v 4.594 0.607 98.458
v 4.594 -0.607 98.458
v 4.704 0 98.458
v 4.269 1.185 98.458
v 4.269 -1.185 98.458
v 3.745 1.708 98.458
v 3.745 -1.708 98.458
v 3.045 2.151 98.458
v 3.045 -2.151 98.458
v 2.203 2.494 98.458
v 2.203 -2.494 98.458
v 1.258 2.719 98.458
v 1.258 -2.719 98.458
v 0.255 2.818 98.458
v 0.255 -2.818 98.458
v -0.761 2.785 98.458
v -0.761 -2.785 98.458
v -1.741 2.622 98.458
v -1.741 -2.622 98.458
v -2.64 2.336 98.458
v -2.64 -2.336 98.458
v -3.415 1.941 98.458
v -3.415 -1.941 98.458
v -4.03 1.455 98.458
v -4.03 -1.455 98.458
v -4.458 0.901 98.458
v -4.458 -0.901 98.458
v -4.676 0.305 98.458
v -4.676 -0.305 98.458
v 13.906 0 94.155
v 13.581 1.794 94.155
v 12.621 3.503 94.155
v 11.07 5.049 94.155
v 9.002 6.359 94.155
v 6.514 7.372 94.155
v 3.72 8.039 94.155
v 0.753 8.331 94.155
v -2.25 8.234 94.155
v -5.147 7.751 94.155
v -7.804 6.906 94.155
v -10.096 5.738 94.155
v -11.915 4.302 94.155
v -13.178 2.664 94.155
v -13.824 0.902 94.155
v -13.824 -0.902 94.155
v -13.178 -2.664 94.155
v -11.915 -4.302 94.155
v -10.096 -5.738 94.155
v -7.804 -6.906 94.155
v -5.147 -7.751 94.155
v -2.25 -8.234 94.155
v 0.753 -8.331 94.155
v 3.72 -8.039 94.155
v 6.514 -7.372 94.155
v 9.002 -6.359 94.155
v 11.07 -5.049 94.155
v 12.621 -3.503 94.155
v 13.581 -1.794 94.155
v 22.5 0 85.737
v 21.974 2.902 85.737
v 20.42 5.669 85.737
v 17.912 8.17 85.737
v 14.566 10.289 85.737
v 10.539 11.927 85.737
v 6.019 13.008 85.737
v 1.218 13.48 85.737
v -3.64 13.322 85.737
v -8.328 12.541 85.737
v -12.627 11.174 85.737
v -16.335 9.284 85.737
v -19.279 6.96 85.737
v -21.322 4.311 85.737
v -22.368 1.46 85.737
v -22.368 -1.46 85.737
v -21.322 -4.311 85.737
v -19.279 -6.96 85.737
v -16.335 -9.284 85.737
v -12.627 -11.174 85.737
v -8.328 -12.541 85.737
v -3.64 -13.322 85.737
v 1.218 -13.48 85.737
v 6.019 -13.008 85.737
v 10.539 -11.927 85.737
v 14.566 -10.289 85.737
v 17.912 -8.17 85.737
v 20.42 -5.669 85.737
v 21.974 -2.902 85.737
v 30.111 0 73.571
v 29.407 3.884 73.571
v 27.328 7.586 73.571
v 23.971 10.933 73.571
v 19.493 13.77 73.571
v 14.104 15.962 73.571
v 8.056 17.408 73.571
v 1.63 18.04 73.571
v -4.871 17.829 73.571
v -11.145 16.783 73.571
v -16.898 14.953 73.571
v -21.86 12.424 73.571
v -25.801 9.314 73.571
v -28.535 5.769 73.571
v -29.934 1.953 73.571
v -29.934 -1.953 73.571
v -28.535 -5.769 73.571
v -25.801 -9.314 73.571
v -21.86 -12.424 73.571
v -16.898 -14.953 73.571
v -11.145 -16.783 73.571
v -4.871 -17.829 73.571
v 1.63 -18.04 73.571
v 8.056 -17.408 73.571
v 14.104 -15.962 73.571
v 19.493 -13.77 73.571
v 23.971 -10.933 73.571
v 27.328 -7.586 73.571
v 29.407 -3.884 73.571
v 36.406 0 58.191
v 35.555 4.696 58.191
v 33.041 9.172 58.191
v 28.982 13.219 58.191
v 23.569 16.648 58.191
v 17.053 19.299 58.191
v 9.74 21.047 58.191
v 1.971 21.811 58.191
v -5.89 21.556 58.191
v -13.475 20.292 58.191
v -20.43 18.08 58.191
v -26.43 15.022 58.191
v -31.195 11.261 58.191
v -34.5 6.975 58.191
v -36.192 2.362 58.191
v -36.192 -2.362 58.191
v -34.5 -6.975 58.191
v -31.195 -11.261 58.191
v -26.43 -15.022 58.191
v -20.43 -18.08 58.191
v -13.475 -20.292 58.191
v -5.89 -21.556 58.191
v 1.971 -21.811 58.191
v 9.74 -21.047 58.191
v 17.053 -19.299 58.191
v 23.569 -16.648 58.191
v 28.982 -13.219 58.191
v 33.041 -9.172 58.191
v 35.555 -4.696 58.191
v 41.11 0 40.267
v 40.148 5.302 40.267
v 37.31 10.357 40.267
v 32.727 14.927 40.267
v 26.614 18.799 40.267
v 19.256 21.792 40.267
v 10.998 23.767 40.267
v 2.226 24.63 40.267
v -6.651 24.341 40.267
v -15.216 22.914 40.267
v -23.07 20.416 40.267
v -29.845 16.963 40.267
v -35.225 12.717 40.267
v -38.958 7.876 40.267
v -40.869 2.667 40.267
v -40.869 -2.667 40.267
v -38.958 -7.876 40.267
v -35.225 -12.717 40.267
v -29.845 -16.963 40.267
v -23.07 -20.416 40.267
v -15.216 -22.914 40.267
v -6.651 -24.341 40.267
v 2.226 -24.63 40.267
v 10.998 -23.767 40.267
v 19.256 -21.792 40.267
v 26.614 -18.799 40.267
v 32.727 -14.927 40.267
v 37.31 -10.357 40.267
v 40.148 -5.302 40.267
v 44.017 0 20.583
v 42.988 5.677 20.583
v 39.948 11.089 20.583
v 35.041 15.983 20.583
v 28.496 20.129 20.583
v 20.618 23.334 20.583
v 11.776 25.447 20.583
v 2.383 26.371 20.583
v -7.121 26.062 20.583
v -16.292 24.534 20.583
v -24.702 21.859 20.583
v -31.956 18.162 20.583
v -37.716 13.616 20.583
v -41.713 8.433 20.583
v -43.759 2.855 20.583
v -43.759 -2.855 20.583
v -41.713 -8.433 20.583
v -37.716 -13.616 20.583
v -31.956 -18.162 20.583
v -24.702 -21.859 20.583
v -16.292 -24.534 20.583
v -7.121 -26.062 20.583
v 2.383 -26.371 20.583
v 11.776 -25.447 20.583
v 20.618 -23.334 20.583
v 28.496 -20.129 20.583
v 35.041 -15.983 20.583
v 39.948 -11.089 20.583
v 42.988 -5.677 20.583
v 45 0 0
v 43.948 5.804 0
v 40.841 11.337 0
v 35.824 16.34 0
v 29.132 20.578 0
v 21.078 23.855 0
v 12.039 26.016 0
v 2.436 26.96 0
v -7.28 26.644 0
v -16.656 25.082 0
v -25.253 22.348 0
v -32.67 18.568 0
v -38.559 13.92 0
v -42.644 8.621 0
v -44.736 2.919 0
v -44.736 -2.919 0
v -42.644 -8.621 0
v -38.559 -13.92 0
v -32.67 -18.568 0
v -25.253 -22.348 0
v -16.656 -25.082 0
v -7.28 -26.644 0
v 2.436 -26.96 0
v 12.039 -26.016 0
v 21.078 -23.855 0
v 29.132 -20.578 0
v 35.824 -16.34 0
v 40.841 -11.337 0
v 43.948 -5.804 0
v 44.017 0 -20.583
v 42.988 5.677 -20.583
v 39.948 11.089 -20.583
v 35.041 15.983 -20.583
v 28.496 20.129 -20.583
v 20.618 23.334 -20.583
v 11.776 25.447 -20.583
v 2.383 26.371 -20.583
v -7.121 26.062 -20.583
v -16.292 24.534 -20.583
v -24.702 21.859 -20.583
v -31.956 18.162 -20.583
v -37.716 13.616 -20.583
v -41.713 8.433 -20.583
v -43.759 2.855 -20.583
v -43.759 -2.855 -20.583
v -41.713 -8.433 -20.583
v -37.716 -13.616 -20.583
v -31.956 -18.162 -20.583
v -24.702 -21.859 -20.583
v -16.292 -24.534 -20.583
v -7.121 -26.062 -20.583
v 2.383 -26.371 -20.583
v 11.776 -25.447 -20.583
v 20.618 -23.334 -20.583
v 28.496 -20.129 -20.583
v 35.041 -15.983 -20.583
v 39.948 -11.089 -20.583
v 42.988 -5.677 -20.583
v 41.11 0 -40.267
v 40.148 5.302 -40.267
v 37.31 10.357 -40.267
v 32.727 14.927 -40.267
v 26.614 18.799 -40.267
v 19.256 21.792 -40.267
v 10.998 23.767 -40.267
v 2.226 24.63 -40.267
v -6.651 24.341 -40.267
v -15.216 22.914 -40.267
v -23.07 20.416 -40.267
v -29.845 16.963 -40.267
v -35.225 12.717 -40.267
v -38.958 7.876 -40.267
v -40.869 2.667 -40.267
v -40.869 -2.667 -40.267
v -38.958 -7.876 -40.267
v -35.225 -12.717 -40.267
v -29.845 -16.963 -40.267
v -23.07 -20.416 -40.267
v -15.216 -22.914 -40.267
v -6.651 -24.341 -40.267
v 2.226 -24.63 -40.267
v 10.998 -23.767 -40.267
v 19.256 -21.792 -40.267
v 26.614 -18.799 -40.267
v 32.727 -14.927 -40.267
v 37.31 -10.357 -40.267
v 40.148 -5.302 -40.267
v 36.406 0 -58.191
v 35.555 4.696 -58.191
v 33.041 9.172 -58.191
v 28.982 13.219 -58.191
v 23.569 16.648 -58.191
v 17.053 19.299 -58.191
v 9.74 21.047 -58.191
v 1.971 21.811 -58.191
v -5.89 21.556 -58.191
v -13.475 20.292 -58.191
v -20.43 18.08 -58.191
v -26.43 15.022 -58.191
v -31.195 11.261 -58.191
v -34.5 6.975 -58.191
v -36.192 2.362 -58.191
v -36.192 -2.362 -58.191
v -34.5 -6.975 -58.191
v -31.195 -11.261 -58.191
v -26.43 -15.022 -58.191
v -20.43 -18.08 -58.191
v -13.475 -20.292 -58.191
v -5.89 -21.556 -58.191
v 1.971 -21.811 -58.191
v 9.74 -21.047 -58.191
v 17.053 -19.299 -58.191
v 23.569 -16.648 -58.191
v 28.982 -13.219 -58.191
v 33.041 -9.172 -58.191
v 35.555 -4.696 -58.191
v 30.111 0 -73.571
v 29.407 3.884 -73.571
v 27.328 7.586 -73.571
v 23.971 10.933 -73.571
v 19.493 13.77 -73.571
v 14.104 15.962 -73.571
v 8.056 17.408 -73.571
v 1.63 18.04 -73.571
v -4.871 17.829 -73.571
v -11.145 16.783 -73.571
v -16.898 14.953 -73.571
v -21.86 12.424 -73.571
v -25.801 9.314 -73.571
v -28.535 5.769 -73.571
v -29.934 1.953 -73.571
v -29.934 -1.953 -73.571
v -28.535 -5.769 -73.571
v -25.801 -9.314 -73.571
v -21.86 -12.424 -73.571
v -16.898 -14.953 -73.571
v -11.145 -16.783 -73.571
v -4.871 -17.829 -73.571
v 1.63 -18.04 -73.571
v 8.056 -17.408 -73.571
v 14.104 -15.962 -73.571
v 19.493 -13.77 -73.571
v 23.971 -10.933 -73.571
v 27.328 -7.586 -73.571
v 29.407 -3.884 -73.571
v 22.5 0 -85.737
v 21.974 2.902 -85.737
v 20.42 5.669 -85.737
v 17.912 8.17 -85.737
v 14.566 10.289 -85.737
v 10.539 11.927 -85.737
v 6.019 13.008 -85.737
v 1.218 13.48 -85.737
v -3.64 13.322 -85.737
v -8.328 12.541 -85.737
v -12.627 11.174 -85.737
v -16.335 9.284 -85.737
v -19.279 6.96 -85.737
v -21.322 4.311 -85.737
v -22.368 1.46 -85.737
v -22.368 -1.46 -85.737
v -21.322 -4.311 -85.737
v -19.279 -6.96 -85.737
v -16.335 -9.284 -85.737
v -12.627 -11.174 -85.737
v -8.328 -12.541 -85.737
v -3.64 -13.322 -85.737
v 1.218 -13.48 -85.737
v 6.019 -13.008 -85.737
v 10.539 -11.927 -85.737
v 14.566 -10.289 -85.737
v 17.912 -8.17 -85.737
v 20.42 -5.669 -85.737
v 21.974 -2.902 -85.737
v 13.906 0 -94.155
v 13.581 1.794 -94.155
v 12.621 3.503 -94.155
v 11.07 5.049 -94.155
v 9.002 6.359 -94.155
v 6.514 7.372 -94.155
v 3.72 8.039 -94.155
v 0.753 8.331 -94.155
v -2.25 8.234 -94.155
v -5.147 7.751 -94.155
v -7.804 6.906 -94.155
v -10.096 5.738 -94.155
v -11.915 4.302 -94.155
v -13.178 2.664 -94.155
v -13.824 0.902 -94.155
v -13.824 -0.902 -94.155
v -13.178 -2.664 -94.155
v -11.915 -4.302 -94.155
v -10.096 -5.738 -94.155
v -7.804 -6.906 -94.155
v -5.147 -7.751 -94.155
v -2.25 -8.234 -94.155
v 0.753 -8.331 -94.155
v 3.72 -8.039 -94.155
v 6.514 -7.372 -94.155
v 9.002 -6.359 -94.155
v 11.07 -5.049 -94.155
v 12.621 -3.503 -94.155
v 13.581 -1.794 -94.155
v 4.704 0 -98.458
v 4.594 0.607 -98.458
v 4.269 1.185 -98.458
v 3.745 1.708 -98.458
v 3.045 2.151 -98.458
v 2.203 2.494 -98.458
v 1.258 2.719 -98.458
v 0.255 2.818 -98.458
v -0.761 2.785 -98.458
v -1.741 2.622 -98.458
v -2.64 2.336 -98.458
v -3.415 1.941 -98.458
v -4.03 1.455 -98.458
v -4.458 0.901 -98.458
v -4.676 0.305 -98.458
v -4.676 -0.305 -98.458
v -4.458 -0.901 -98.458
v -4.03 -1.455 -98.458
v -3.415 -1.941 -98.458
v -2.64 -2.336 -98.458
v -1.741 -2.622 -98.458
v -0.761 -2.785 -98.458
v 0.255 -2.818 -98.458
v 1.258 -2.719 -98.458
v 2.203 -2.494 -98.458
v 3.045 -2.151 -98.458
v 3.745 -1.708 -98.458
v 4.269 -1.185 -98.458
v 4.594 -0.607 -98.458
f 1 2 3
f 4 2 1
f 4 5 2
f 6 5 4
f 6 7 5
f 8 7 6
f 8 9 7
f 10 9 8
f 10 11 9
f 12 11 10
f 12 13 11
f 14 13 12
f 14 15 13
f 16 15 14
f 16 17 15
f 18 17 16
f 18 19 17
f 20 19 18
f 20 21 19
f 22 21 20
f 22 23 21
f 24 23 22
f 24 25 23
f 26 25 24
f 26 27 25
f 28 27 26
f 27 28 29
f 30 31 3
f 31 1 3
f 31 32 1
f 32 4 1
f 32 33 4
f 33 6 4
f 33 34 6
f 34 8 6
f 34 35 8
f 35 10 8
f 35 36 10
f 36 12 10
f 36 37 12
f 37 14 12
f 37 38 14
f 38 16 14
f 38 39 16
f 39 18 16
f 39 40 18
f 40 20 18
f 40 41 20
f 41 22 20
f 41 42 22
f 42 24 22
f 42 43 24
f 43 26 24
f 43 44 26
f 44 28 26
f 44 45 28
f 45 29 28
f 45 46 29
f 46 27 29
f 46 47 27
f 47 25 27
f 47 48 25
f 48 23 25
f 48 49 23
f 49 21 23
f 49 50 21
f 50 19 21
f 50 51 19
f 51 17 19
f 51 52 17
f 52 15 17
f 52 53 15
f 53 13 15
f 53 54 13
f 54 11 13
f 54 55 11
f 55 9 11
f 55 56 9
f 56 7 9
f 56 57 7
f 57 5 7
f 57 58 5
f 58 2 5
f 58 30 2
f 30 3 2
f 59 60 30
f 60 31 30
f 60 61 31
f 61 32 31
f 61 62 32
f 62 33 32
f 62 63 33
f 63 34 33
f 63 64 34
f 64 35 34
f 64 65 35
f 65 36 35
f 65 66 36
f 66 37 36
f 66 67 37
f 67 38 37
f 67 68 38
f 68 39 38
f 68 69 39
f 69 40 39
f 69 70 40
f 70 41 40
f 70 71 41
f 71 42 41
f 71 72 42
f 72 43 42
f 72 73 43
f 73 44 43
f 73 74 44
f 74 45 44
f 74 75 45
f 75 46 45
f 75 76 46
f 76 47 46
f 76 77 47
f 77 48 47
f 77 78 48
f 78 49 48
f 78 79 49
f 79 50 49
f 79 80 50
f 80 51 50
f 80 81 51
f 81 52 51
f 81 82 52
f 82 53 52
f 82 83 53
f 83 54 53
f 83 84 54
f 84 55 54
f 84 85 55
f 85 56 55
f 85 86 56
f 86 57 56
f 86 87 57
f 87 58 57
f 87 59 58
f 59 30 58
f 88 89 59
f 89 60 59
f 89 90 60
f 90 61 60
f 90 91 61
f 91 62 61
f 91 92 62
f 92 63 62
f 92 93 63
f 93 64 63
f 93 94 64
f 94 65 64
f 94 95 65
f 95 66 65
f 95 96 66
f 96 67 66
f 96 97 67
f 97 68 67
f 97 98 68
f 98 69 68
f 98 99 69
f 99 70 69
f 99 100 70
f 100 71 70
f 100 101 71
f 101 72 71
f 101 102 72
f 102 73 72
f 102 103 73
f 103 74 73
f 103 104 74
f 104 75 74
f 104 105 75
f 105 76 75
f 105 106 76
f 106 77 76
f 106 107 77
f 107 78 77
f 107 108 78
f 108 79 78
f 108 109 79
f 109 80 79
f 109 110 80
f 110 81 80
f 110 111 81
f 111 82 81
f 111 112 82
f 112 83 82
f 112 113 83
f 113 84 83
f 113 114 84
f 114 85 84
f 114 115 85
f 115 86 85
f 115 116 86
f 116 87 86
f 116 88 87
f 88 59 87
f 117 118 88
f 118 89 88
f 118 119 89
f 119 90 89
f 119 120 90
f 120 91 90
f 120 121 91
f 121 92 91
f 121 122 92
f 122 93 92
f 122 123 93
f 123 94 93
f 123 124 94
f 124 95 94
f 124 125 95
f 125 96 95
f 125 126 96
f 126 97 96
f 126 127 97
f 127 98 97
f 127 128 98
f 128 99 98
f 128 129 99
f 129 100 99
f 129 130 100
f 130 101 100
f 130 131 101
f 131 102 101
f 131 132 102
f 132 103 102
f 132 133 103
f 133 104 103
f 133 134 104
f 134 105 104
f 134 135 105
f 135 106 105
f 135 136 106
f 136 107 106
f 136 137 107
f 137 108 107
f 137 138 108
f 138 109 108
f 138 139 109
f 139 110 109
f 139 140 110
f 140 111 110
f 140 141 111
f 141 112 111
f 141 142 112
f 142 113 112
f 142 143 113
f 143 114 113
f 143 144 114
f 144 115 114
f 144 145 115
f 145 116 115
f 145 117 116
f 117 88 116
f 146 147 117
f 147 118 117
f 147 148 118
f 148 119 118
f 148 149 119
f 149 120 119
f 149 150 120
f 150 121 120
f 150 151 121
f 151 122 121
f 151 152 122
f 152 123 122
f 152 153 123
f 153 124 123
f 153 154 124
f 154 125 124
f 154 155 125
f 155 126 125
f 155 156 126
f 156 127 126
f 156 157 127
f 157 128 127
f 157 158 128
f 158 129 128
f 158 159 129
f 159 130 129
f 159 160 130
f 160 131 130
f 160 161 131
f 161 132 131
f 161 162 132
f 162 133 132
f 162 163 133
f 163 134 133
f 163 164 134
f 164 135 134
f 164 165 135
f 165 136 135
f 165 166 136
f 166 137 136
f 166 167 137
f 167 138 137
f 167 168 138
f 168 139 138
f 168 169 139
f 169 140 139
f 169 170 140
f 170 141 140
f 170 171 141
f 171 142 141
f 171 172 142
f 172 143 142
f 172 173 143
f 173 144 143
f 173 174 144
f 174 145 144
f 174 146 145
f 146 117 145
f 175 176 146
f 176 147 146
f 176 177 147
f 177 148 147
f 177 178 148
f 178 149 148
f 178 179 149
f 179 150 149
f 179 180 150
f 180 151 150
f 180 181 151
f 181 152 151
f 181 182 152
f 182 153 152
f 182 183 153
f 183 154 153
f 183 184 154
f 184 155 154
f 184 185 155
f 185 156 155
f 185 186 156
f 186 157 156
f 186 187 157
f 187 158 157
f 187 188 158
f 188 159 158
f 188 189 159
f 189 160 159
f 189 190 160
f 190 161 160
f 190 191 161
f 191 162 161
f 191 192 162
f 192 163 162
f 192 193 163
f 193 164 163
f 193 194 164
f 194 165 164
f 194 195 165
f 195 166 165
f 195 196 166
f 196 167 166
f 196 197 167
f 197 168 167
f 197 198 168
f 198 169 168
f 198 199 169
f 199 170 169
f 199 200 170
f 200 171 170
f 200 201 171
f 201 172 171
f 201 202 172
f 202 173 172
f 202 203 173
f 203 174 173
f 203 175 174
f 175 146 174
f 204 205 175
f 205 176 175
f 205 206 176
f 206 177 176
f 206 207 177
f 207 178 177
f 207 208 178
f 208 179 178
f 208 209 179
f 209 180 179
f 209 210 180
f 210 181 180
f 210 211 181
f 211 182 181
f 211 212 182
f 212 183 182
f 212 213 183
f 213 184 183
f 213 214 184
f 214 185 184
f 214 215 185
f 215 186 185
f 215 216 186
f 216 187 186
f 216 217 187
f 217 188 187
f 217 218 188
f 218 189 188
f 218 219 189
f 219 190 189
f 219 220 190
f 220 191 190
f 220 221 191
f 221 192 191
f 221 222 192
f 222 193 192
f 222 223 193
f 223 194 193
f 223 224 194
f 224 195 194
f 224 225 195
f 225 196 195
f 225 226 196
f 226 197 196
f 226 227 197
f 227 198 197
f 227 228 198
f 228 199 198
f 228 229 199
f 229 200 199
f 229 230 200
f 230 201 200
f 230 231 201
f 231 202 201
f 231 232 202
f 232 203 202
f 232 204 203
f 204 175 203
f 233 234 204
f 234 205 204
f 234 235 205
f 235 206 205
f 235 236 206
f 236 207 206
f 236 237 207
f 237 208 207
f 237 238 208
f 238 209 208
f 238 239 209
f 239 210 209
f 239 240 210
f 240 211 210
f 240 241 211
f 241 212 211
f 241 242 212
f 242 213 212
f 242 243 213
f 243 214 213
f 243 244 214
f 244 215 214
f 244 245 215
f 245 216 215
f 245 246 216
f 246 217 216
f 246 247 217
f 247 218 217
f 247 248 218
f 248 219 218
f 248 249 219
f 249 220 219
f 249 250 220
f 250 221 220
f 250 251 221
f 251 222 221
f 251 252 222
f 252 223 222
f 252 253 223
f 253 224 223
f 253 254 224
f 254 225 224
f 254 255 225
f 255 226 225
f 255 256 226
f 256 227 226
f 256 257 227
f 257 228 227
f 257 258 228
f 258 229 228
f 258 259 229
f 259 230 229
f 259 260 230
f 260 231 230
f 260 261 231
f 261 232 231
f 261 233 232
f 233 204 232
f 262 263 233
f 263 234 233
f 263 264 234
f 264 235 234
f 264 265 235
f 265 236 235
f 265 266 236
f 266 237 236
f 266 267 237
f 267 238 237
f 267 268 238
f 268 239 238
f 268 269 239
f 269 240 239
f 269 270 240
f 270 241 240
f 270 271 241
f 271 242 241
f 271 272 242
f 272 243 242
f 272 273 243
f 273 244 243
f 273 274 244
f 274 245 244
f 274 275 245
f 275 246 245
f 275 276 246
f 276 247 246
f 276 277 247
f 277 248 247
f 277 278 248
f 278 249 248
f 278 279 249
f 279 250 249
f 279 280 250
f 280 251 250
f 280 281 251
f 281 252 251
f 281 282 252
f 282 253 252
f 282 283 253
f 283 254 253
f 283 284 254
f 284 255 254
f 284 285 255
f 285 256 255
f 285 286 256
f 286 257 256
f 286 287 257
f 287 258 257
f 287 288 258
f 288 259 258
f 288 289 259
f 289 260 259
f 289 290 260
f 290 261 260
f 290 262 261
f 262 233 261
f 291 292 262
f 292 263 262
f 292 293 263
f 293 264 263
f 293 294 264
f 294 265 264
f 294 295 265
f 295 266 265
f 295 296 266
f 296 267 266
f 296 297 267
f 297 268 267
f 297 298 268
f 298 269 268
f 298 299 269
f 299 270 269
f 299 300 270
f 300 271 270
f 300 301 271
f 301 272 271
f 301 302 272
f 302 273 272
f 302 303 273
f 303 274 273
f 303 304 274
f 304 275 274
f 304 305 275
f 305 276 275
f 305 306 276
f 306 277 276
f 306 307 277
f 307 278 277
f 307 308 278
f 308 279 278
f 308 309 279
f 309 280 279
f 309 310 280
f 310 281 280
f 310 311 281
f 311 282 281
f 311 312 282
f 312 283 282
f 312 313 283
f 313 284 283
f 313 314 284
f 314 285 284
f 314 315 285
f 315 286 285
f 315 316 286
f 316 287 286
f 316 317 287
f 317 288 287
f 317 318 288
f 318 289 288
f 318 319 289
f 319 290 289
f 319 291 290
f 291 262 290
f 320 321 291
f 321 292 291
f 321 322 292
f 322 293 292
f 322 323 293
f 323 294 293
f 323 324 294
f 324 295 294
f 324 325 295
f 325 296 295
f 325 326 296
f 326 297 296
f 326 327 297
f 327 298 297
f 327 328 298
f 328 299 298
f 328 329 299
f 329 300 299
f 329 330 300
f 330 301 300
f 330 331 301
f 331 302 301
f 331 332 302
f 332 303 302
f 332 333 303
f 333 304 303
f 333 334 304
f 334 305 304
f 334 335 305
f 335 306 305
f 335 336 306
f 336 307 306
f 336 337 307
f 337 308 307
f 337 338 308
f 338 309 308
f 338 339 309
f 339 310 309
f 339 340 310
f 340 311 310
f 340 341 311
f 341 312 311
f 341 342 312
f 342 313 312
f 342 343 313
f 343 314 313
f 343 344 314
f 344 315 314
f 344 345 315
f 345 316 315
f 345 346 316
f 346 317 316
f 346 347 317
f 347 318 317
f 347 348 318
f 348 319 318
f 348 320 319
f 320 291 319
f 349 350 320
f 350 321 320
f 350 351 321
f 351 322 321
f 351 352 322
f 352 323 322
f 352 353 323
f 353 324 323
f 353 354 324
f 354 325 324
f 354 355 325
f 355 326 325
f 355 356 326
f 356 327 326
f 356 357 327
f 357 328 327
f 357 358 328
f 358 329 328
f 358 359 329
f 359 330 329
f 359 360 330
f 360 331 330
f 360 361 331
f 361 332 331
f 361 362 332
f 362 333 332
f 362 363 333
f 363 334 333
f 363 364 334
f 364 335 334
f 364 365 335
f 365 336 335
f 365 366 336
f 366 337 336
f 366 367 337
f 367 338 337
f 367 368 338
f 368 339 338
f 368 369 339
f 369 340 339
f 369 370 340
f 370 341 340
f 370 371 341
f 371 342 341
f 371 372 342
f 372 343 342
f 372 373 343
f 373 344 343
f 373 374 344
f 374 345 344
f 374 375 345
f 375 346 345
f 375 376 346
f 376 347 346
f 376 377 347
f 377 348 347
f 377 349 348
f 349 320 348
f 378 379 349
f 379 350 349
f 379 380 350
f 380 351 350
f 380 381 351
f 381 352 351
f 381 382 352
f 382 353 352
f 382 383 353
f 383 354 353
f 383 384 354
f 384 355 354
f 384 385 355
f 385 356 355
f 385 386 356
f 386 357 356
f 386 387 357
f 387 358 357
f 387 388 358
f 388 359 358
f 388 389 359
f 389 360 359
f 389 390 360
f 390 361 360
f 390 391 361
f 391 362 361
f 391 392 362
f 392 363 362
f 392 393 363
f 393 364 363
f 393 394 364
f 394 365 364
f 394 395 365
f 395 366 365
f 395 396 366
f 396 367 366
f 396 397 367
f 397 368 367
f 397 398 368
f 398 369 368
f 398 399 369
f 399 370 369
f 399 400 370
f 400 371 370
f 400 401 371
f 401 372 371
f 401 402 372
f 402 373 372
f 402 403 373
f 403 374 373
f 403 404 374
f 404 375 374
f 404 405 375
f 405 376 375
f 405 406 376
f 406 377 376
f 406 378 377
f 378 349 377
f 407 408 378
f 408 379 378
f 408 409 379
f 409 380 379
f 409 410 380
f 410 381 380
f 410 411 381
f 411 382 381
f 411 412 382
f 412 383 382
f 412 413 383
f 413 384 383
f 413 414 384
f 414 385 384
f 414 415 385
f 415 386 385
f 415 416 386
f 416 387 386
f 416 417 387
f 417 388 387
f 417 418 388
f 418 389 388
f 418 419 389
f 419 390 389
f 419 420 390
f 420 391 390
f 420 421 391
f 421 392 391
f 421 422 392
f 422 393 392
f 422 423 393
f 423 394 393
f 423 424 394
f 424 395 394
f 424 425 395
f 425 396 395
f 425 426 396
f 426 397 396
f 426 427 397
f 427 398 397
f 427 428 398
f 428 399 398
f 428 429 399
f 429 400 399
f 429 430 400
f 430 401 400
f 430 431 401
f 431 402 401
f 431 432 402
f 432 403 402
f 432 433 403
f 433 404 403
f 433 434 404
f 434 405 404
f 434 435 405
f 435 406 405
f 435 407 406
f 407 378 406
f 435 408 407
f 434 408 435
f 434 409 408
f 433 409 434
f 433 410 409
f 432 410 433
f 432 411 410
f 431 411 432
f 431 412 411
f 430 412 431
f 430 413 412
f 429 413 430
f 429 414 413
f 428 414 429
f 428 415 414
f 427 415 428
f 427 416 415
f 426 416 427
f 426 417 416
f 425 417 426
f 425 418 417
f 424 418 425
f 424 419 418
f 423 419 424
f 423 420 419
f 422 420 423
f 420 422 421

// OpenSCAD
// Generated by SolidPython 1.0.1 on 2020-07-29 00:46:46


scale(v = [5, 3, 11]) {
	sphere(r = 9);
}
/***********************************************
*********      SolidPython code:      **********
************************************************
 
# import packages: SolidPython
from solid import *
from solid.utils import *
from itertools import chain, combinations, permutations


class Resize:

    def __init__(self, scad_file):
        self.scad_file = scad_file
        #self.scad_file = import_scad(scad_file)
        # cone/cylinder param:
        self.r1 = 0
        self.r2 = 0
        self.h = 0
        # rectangular prism param:
        self.w = 0
        self.l = 0
        # ellipse param:
        self.r = 0

    # import OpenScad code (file name corresponds to shape)


    # classify shape + parameters
    def assign(self, param1, param2, param3):
        if self.scad_file == 'cone.scad':
            self.r1 = param1
            self.r2 = param2
            self.h = param3
        elif self.scad_file == 'cylinder.scad':
            self.r1 = param1
            self.r2 = param2
            self.h = param3
        elif self.scad_file == 'rectangularPrism.scad':
            self.h = param1
            self.l = param2
            self.w = param3
        else:
            self.r = param1
            self.h = param2

    # resize parameters
    def iterate(self):
        x = range(3, 20, 2)
        i = 1
        if self.scad_file == 'cone.scad':
            tempList = list(permutations(x, 2))
            for temp in tempList:
                param1 = temp[0]
                param2 = temp[1]
                filepath = 'produced_scad_files/' + 'cone' + str(param1) + '_' + str(param2) + '_' + '.scad'
                scad_render_to_file(cylinder(h=param1, r1=param2, r2=0), filepath)

        elif self.scad_file == 'cylinder.scad':
            tempList = list(permutations(x, 3))
            for temp in tempList:
                param1 = temp[0]
                param2 = temp[1]
                filepath = 'produced_scad_files/' + 'cylinder' + str(param1) + '_' + str(param2) + '_' + '.scad'
                scad_render_to_file(cylinder(h=param1, r1=param2, r2=param2), filepath)

        elif self.scad_file == 'rectangularPrism.scad':
            tempList = list(permutations(x, 3))
            for temp in tempList:
                param1 = temp[0]
                param2 = temp[1]
                param3 = temp[2]
                filepath = 'produced_scad_files/' + 'rectangularPrism' + str(param1) + '_' + str(param2) + '_' + str(
                    param3) + '.scad'
                scad_render_to_file(cube(size=(param1, param2, param3)), filepath)

        elif self.scad_file == 'ellipse.scad':
            tempList = list(permutations(x, 4))
            for temp in tempList:
                param1 = temp[0]
                param2 = temp[1]
                param3 = temp[2]
                param4 = temp[3]
                filepath = 'produced_scad_files/' + 'ellipse' + str(param1) + '_' + str(param2) + '_' + str(param3) + '_' + str(param4) + '.scad'
                scad_render_to_file(scale([param1, param2, param3])(sphere(r=param4)), filepath)

    def render_to_scadfile(self):
        scad_render_to_file(scad, 'example.scad') 
 
************************************************/
